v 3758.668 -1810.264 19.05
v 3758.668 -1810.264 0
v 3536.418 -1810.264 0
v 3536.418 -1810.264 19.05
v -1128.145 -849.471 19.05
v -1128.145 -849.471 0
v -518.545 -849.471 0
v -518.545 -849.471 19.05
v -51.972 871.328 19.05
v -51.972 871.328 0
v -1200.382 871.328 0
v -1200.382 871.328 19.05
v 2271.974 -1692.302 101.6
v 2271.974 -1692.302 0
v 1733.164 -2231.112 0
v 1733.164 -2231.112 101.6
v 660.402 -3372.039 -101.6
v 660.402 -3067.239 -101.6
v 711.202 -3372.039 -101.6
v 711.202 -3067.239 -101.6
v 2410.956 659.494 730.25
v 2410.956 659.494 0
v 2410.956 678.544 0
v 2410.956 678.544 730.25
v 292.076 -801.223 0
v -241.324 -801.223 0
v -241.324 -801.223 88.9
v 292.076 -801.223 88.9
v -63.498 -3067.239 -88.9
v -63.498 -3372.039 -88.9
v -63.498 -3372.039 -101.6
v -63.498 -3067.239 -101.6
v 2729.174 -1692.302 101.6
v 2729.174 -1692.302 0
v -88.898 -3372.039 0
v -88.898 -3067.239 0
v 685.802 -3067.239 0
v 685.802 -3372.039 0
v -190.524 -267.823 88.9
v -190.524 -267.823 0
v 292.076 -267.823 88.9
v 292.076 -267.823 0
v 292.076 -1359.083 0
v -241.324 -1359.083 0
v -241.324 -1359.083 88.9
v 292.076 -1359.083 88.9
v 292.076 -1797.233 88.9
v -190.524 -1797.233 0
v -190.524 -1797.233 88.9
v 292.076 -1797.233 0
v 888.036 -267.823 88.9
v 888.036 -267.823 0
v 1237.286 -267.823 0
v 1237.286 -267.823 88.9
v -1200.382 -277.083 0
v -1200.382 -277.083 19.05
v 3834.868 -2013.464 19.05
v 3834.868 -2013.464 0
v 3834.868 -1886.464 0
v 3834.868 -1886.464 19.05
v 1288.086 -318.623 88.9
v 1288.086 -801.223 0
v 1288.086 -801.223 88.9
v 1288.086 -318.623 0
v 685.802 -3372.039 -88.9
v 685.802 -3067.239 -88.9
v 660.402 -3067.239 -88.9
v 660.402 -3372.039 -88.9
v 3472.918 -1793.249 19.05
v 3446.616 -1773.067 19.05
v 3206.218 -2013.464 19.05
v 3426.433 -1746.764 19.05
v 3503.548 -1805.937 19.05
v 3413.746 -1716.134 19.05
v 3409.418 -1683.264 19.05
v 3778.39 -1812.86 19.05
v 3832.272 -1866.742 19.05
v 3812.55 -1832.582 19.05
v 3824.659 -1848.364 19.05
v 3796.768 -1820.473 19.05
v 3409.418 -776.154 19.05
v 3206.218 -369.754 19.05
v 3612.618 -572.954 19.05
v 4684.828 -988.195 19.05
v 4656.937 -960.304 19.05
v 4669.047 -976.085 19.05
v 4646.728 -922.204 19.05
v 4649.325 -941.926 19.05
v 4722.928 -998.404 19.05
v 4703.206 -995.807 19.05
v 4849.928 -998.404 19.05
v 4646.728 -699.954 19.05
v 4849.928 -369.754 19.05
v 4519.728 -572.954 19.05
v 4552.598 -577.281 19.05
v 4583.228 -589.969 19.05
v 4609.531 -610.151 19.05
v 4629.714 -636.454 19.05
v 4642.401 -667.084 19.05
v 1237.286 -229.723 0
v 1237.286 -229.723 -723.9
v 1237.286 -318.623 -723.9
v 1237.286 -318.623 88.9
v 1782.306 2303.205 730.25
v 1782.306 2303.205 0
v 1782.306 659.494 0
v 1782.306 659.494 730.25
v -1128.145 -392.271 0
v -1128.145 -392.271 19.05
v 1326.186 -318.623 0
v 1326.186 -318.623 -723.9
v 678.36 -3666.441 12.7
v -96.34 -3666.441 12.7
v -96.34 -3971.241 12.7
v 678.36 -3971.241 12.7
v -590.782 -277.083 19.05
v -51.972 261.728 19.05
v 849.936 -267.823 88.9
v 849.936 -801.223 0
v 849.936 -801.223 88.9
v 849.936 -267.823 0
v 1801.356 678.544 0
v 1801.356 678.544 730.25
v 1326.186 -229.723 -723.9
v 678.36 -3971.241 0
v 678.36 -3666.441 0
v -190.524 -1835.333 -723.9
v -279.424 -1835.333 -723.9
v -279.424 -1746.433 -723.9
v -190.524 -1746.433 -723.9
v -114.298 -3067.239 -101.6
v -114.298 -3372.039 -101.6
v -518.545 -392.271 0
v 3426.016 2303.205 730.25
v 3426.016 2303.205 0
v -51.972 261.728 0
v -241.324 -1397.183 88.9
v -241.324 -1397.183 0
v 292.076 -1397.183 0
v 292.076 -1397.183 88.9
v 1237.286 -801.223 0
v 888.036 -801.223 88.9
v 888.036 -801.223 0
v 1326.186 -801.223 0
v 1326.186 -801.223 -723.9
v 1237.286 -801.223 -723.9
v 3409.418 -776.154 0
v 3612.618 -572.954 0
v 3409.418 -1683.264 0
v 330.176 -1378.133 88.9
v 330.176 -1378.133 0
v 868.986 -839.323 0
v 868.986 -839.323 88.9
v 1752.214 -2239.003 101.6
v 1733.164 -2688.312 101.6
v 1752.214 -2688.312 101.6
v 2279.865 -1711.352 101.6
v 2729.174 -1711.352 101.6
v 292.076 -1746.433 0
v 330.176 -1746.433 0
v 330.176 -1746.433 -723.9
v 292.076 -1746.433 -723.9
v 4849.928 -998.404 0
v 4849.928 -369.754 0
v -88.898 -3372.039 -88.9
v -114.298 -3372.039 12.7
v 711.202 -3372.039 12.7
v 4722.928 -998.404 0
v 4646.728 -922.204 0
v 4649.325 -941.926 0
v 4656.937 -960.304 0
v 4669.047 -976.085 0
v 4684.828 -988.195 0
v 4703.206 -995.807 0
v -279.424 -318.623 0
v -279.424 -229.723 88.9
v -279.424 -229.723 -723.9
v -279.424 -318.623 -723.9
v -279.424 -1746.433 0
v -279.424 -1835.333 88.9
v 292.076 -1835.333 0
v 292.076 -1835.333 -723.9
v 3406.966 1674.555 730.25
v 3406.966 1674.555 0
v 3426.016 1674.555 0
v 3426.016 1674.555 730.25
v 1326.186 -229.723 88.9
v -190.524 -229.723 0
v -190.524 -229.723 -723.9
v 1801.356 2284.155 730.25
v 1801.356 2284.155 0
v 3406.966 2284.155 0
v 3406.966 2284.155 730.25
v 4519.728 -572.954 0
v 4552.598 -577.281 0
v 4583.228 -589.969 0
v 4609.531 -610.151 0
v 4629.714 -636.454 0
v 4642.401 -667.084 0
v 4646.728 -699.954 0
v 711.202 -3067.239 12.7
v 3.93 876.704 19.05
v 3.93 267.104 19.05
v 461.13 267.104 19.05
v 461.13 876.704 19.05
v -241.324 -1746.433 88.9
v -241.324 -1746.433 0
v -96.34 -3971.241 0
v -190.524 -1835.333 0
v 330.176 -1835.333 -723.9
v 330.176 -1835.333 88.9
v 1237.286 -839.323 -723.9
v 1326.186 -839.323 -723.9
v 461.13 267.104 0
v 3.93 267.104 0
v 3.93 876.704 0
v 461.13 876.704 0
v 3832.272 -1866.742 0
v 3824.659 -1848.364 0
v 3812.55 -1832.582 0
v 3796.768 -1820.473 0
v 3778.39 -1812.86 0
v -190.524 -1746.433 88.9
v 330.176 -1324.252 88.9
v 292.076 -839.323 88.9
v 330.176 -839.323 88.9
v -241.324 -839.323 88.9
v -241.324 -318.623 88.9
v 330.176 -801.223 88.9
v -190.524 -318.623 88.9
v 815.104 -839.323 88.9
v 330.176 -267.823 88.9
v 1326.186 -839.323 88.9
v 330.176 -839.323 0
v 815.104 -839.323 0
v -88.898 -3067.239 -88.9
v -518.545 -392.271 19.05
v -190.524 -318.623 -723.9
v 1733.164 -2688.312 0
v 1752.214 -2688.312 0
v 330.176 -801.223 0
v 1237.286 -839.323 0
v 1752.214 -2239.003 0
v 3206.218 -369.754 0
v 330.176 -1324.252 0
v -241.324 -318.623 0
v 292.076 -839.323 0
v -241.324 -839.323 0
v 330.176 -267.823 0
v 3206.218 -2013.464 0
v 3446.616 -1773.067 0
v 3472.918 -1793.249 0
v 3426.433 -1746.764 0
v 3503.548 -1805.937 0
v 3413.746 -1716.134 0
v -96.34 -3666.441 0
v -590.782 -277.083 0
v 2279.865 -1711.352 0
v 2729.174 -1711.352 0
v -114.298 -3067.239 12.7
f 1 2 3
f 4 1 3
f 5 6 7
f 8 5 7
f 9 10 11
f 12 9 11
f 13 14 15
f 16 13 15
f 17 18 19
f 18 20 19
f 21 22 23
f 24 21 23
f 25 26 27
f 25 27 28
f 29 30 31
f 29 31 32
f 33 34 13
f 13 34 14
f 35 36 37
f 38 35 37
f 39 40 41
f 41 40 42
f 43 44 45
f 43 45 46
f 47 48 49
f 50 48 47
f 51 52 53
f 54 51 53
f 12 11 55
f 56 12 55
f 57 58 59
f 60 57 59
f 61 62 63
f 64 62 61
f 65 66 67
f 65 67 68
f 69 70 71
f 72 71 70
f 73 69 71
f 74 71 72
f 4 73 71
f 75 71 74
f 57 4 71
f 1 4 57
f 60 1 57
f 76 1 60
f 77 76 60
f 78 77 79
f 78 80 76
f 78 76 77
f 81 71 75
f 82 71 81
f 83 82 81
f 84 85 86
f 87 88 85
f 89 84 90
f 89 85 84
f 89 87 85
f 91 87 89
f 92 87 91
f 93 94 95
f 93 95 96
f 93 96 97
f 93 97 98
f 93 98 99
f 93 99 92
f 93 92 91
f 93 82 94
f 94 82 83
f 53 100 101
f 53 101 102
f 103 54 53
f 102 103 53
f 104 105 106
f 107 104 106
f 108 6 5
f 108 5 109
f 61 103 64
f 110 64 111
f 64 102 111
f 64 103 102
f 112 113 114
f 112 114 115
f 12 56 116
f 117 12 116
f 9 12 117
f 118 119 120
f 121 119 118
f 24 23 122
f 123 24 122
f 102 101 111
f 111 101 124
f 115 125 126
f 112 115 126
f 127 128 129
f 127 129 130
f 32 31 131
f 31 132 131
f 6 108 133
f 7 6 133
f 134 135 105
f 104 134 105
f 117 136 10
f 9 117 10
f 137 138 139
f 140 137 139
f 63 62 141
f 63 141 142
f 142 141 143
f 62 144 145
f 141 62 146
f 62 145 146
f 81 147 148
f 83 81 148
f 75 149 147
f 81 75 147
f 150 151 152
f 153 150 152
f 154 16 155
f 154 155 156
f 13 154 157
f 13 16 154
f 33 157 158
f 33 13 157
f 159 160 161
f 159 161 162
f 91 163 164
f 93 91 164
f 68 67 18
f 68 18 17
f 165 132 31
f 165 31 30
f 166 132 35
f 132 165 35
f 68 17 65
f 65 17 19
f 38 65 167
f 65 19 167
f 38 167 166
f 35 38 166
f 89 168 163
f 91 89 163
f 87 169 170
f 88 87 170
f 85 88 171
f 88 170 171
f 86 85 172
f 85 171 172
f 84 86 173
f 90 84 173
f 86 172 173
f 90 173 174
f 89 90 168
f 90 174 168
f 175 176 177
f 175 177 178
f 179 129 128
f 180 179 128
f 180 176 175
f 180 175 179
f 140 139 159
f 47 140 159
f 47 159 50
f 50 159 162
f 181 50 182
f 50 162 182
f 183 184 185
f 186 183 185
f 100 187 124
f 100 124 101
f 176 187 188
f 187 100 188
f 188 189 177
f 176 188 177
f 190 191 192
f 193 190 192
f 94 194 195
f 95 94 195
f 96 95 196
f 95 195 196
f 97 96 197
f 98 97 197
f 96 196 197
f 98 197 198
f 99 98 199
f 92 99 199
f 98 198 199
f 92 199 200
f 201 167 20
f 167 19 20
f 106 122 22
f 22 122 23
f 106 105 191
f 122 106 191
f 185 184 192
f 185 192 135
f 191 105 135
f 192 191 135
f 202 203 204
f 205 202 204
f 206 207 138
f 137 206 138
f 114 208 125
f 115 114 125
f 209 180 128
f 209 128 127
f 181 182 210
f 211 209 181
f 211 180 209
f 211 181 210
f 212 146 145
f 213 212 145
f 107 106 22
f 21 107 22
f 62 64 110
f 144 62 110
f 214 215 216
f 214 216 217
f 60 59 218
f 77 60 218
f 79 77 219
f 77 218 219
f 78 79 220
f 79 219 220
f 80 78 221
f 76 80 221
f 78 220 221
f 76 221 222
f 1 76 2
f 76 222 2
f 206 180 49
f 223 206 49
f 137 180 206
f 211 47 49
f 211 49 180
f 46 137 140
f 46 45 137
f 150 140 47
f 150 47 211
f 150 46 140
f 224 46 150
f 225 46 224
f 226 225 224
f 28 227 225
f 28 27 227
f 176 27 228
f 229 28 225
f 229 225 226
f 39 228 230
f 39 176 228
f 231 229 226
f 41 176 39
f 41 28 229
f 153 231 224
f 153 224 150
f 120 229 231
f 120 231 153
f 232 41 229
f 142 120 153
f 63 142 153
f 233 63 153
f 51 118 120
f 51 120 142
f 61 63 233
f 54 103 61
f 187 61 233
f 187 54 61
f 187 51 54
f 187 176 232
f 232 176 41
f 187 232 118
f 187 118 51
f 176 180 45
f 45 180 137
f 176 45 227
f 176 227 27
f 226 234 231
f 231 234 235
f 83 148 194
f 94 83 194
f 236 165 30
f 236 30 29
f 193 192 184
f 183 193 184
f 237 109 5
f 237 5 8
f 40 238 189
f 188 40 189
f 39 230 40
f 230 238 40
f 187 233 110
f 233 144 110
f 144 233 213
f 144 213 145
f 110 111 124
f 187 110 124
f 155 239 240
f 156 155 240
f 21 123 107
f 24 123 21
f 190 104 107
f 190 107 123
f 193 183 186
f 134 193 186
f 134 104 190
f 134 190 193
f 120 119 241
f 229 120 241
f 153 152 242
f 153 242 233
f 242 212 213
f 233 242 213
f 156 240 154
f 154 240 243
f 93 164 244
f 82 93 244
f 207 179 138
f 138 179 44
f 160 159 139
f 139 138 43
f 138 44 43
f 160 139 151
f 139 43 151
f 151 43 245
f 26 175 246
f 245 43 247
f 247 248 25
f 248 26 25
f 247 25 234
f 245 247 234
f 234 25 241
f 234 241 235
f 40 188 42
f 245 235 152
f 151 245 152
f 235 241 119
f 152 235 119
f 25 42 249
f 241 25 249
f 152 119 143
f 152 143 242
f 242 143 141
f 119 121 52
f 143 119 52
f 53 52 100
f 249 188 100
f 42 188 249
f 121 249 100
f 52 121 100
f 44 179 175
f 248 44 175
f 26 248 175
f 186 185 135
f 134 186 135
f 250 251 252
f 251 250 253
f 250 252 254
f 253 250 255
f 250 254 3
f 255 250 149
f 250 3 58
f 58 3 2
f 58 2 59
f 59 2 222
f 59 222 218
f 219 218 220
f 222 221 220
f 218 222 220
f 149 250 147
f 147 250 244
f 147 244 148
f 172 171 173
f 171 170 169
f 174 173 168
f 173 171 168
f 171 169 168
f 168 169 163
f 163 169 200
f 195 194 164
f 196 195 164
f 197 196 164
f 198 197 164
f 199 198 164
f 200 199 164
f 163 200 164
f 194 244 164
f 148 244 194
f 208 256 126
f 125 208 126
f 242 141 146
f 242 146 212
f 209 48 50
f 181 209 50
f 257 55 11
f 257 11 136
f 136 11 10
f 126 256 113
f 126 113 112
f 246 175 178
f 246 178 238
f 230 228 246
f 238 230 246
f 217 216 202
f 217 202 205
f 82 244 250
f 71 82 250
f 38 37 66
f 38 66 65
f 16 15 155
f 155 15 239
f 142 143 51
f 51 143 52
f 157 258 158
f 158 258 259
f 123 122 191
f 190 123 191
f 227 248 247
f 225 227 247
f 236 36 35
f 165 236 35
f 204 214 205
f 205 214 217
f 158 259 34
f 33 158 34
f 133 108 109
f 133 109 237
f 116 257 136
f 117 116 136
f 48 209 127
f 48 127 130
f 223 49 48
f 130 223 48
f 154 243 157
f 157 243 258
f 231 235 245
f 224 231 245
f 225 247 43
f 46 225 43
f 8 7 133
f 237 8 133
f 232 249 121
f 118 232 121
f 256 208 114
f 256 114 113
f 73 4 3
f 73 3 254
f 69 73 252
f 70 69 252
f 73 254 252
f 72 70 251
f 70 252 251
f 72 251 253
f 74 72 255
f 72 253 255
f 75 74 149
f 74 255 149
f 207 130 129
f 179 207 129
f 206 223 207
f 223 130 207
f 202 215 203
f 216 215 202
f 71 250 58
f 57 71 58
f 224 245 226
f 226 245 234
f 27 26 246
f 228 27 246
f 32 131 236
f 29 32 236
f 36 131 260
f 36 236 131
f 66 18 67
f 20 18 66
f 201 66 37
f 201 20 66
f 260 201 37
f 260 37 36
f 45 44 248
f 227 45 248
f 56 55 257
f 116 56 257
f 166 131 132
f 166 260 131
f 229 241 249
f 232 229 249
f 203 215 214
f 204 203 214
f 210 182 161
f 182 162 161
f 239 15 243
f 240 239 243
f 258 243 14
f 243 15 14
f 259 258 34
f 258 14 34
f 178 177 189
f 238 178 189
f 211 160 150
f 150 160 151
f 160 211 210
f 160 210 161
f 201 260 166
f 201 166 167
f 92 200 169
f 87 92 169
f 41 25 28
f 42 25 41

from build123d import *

# Parameters (mm, degrees)
F1_DEPTH  = 19.05
F2_W      = 609.6
F2_H      = 457.2
F3_DEPTH  = 19.05
F2_W_2    = 457.2
F2_H_2    = 609.6
F4_W      = 38.1
F4_H      = 533.4
F4_W_2    = 533.4
F4_H_2    = 38.1
F4_H_3    = 482.6
F4_W_3    = 482.6
F5_DEPTH  = 88.9
F6_DEPTH  = 723.9
F8_DEPTH  = 730.25
F10_DEPTH = 19.05
F12_DEPTH = 101.6
F13_W     = 825.5
F13_H     = 304.8
F14_DEPTH = 12.7
F13_W_2   = 774.7
F15_W     = 25.4
F15_H     = 304.8
F16_DEPTH = 101.6
F17_W     = 304.8
F17_H     = 12.7
F18_DEPTH = 25.4
F19_W     = 304.8
F19_H     = 12.7
F20_DEPTH = 25.4


with BuildPart() as f1:
    # F0 (on Top) → F1 (new body)
    with BuildSketch(Plane.XY):
        Polygon((-51.9721941534, 871.3275224966), (-304.476781776, 871.3275224966), (-1200.3823941534, -24.5780898807), (-1200.3823941534, -277.0826775034), (-590.7823941534, -277.0826775034), (-590.7823941534, 261.7275224966), (-51.9721941534, 261.7275224966), align=None)
        Polygon((-590.7823941534, -277.0826775034), (-51.9721941534, 261.7275224966), (-590.7823941534, 261.7275224966), align=None)
        Polygon((-304.476781776, 871.3275224966), (-1200.3823941534, 871.3275224966), (-1200.3823941534, -24.5780898807), align=None)
    extrude(amount=F1_DEPTH)


with BuildPart() as f3:
    # F2 (on Top) → F3 (new body)
    with BuildSketch(Plane.XY):
        with Locations((-823.3452288248, -620.8709870014)):
            Rectangle(F2_W, F2_H)
    extrude(amount=F3_DEPTH)


with BuildPart() as f3b:
    # F2 (on Top) → F3, piece 2 (new body)
    with BuildSketch(Plane.XY):
        with Locations((232.5300339319, 571.9040786624)):
            Rectangle(F2_W_2, F2_H_2)
    extrude(amount=F3_DEPTH)


with BuildPart() as f5:
    # F4 (on Top) → F5 (new body)
    with BuildSketch(Plane.XY):
        Polygon((-241.3244870595, -318.6231202126), (-279.4244870595, -318.6231202126), (-279.4244870595, -1746.4333202126), (-241.3244870595, -1746.4333202126), (-241.3244870595, -1397.1833202126), (-241.3244870595, -1359.0833202126), (-241.3244870595, -839.3231202126), (-241.3244870595, -801.2231202126), align=None)
        Polygon((-190.5244870595, -229.7231202126), (-279.4244870595, -229.7231202126), (-279.4244870595, -318.6119198799), (-279.4244870595, -318.6231202126), (-241.3244870595, -318.6231202126), (-190.5244870595, -318.6231202126), (-190.5244870595, -267.8231202126), align=None)
        Polygon((1237.2857129405, -229.7231202126), (-190.5244870595, -229.7231202126), (-190.5244870595, -267.8231202126), (292.0755129405, -267.8231202126), (330.1755129405, -267.8231202126), (849.9357129405, -267.8231202126), (888.0357129405, -267.8231202126), (1237.2857129405, -267.8231202126), align=None)
        with Locations((311.1255129405, -534.5231202126)):
            Rectangle(F4_W, F4_H)
        with Locations((25.3755129405, -820.2731202126)):
            Rectangle(F4_W_2, F4_H_2)
        with Locations((311.1255129405, -820.2731202126)):
            Rectangle(F4_W, F4_H_2)
        Polygon((330.1755129405, -839.3231202126), (292.0755129405, -839.3231202126), (292.0755129405, -1359.0833202126), (292.0755129405, -1397.1833202126), (292.0755129405, -1746.4333202126), (330.1755129405, -1746.4333202126), (330.1755129405, -1378.1333202126), (330.1755129405, -1324.2517834861), align=None)
        Polygon((1237.2857129405, -801.2231202126), (888.0357129405, -801.2231202126), (849.9357129405, -801.2231202126), (330.1755129405, -801.2231202126), (330.1755129405, -839.3231202126), (815.104176214, -839.3231202126), (868.9857129405, -839.3231202126), (1237.2857129405, -839.3231202126), align=None)
        with Locations((868.9857129405, -534.5231202126)):
            Rectangle(F4_W, F4_H)
        Polygon((1326.1857129405, -229.7231202126), (1237.2857129405, -229.7231202126), (1237.2857129405, -267.8231202126), (1237.2857129405, -318.6231202126), (1288.0857129405, -318.6231202126), (1326.1857129405, -318.6231202126), (1326.1857129405, -318.6119198799), align=None)
        with Locations((1307.1357129405, -559.9231202126)):
            Rectangle(F4_W, F4_H_3)
        Polygon((1326.1857129405, -839.3231202126), (1326.1857129405, -801.2231202126), (1288.0857129405, -801.2231202126), (1237.2857129405, -801.2231202126), (1237.2857129405, -839.3231202126), align=None)
        with Locations((25.3755129405, -1378.1333202126)):
            Rectangle(F4_W_2, F4_H_2)
        Polygon((-241.3244870595, -1746.4333202126), (-279.4244870595, -1746.4333202126), (-279.4244870595, -1835.3333202126), (-190.5244870595, -1835.3333202126), (-190.5244870595, -1797.2333202126), (-190.5244870595, -1746.4333202126), align=None)
        with Locations((50.7755129405, -1816.2833202126)):
            Rectangle(F4_W_3, F4_H_2)
        Polygon((292.0755129405, -1797.2333202126), (292.0755129405, -1835.3333202126), (330.1755129405, -1835.3333202126), (330.1755129405, -1746.4333202126), (292.0755129405, -1746.4333202126), align=None)
        Polygon((868.9857129405, -839.3231202126), (815.104176214, -839.3231202126), (330.1755129405, -1324.2517834861), (330.1755129405, -1378.1333202126), align=None)
    extrude(amount=F5_DEPTH)

    # F4 (on Top) → F6 (join)
    with BuildSketch(Plane.XY):
        Polygon((-241.3244870595, -1746.4333202126), (-279.4244870595, -1746.4333202126), (-279.4244870595, -1835.3333202126), (-190.5244870595, -1835.3333202126), (-190.5244870595, -1797.2333202126), (-190.5244870595, -1746.4333202126), align=None)
        Polygon((292.0755129405, -1797.2333202126), (292.0755129405, -1835.3333202126), (330.1755129405, -1835.3333202126), (330.1755129405, -1746.4333202126), (292.0755129405, -1746.4333202126), align=None)
        Polygon((-190.5244870595, -229.7231202126), (-279.4244870595, -229.7231202126), (-279.4244870595, -318.6119198799), (-279.4244870595, -318.6231202126), (-241.3244870595, -318.6231202126), (-190.5244870595, -318.6231202126), (-190.5244870595, -267.8231202126), align=None)
        Polygon((1326.1857129405, -229.7231202126), (1237.2857129405, -229.7231202126), (1237.2857129405, -267.8231202126), (1237.2857129405, -318.6231202126), (1288.0857129405, -318.6231202126), (1326.1857129405, -318.6231202126), (1326.1857129405, -318.6119198799), align=None)
        Polygon((1326.1857129405, -839.3231202126), (1326.1857129405, -801.2231202126), (1288.0857129405, -801.2231202126), (1237.2857129405, -801.2231202126), (1237.2857129405, -839.3231202126), align=None)
    extrude(amount=-F6_DEPTH)


with BuildPart() as f8:
    # F7 (on Top) → F8 (new body)
    with BuildSketch(Plane.XY):
        Polygon((1782.3060198848, 2303.2046501876), (1782.3060198848, 659.4944501876), (2410.9560198848, 659.4944501876), (2410.9560198848, 678.5444501876), (1801.3560198848, 678.5444501876), (1801.3560198848, 2284.1546501876), (3406.9662198848, 2284.1546501876), (3406.9662198848, 1674.5546501876), (3426.0162198848, 1674.5546501876), (3426.0162198848, 2303.2046501876), align=None)
    extrude(amount=F8_DEPTH)


with BuildPart() as f10:
    # F9 (on Top) → F10 (new body)
    with BuildSketch(Plane.XY):
        with BuildLine():
            Line((4849.9282895447, -369.7538028717), (3206.2180895447, -369.7538028717))
            Line((3206.2180895447, -369.7538028717), (3206.2180895447, -2013.4640028717))
            Line((3206.2180895447, -2013.4640028717), (3409.4180895447, -2013.4640028717))
            Line((3409.4180895447, -2013.4640028717), (3834.8680895447, -2013.4640028717))
            Line((3834.8680895447, -2013.4640028717), (3834.8680895447, -1886.4640028717))
            ThreePointArc((3834.8680895447, -1886.4640028717), (3812.5496262711, -1832.5824661453), (3758.6680895447, -1810.2640028717))
            Line((3758.6680895447, -1810.2640028717), (3536.4180895447, -1810.2640028717))
            ThreePointArc((3536.4180895447, -1810.2640028717), (3446.615528334, -1773.0665640824), (3409.4180895447, -1683.2640028717))
            Line((3409.4180895447, -1683.2640028717), (3409.4180895447, -776.1538028717))
            Line((3409.4180895447, -776.1538028717), (3409.4180895447, -572.9538028717))
            Line((3409.4180895447, -572.9538028717), (3612.6180895447, -572.9538028717))
            Line((3612.6180895447, -572.9538028717), (4519.7282895447, -572.9538028717))
            ThreePointArc((4519.7282895447, -572.9538028717), (4609.5308507554, -610.151241661), (4646.7282895447, -699.9538028717))
            Line((4646.7282895447, -699.9538028717), (4646.7282895447, -922.2038028717))
            ThreePointArc((4646.7282895447, -922.2038028717), (4669.0467528183, -976.0853395981), (4722.9282895447, -998.4038028717))
            Line((4722.9282895447, -998.4038028717), (4849.9282895447, -998.4038028717))
            Line((4849.9282895447, -998.4038028717), (4849.9282895447, -572.9538028717))
            Line((4849.9282895447, -572.9538028717), (4849.9282895447, -369.7538028717))
        make_face()
        Polygon((3409.4180895447, -776.1538028717), (3612.6180895447, -572.9538028717), (3409.4180895447, -572.9538028717), align=None)
    extrude(amount=F10_DEPTH)


with BuildPart() as f12:
    # F11 (on Top) → F12 (new body)
    with BuildSketch(Plane.XY):
        Polygon((1733.1636556043, -2258.0527052501), (1752.2136556043, -2239.0027052501), (1752.2136556043, -2212.0619368869), (1733.1636556043, -2231.1119368869), align=None)
        Polygon((1733.1636556043, -2688.3119368869), (1752.2136556043, -2688.3119368869), (1752.2136556043, -2239.0027052501), (1733.1636556043, -2258.0527052501), align=None)
        Polygon((1752.2136556043, -2212.0619368869), (1752.2136556043, -2239.0027052501), (2279.8646239675, -1711.3517368869), (2252.9238556043, -1711.3517368869), align=None)
        Polygon((2252.9238556043, -1711.3517368869), (2279.8646239675, -1711.3517368869), (2298.9146239675, -1692.3017368869), (2271.9738556043, -1692.3017368869), align=None)
        Polygon((2279.8646239675, -1711.3517368869), (2729.1738556043, -1711.3517368869), (2729.1738556043, -1692.3017368869), (2298.9146239675, -1692.3017368869), align=None)
    extrude(amount=F12_DEPTH)


with BuildPart() as f14:
    # F13 (on Top) → F14 (new body)
    with BuildSketch(Plane.XY):
        with Locations((298.4524759054, -3219.6393180847)):
            Rectangle(F13_W, F13_H)
    extrude(amount=F14_DEPTH)

    # F15 (on face) → F16 (join)
    with BuildSketch(Plane(origin=(0, 0, 0), x_dir=(1, 0, 0), z_dir=(0, 0, -1))):
        with Locations((-101.5975240946, 3219.6393180847)):
            Rectangle(F15_W, F15_H)
        with Locations((698.5024759054, 3219.6393180847)):
            Rectangle(F15_W, F15_H)
    extrude(amount=F16_DEPTH)

    # F17 (on face) → F18 (join)
    with BuildSketch(Plane.YZ.offset(-88.8975240946)):
        with Locations((-3219.6393180847, -95.25)):
            Rectangle(F17_W, F17_H)
    extrude(amount=F18_DEPTH)

    # F19 (on face) → F20 (join)
    with BuildSketch(Plane(origin=(685.8024759054, 0, 0), x_dir=(0, -1, 0), z_dir=(-1, 0, 0))):
        with Locations((3219.6393180847, -95.25)):
            Rectangle(F19_W, F19_H)
    extrude(amount=F20_DEPTH)


with BuildPart() as f14b:
    # F13 (on Top) → F14, piece 2 (new body)
    with BuildSketch(Plane.XY):
        with Locations((291.0097837448, -3818.8405711409)):
            Rectangle(F13_W_2, F13_H)
    extrude(amount=F14_DEPTH)


solid = Compound([f1.part, f3.part, f3b.part, f5.part, f8.part, f10.part, f12.part, f14.part, f14b.part])
